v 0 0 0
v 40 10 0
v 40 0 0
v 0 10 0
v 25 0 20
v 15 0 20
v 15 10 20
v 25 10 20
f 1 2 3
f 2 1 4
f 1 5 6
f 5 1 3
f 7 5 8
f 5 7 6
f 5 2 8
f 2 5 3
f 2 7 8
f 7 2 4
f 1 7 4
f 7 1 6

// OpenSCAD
// file: GeometricConstants.scad
// ========================================
// Geometrics
// Version 2 constant definitions
// (c) Ralf Lange, longsoft.de
// ========================================

// include <../raspberry/PiPcbConstants.scad>
// include <../raspberry/PiPartConstants.scad>

// Dimensions

bbHeight = 4;
bbOuterD = 10;
bbInnerD = 6;     // 2*bucketPivotR
// main file
// ========================================
// Geometrics
// Version 1
// (c) Ralf Lange, longsoft.de
// ========================================

// Include the constants with the dimensions
// and the special variables
include <GeometricConstants.scad>;

// Which one would you like to see?
displayBallBearing = false;
displayPrism = true;
displayRamp = false;
displayAll = false;           // All parts together
displayImage = false;         // All parts together in one image

displayDevices = true;
withThread = false;

// Details of the drawing (larger is better)
$fn = 100;
transparency = 0.5;  // 1.0 is opace

module ballBearing(height, outerD, innerD)
{
  padding = (outerD-innerD)/3;
  difference() {
    cylinder(h=height, d=outerD, center = true);
    cylinder(h=height+0.1, d=outerD-padding, center = true);
  }
  color("blue") {
  difference() {
    cylinder(h=height, d=outerD-padding, center = true);
    cylinder(h=height+0.1, d=innerD+padding, center = true);
  }
  }
  difference() {
    cylinder(h=height, d=innerD+padding, center = true);
    cylinder(h=height+0.1, d=innerD, center = true);
  }
}

module prism(widthBottom, depth, height, widthTop = 0.1, center = false)
{
  assert(widthTop > 0, "");
  
  CubePoints = [
    [ 0, 0, 0 ],                                  // 0
    [ widthBottom, 0, 0 ],                        // 1
    [ widthBottom, depth, 0 ],                    // 2
    [ 0, depth, 0 ],                              // 3
    [ (widthBottom-widthTop)/2, 0, height ],      // 4
    [ (widthBottom+widthTop)/2, 0, height ],      // 5
    [ (widthBottom+widthTop)/2, depth, height ],  // 6
    [ (widthBottom-widthTop)/2, depth, height ]   // 7
  ];
  
  CubeFaces = [
    [0,1,2,3],  // bottom
    [4,5,1,0],  // front
    [7,6,5,4],  // top
    [5,6,2,1],  // right
    [6,7,3,2],  // back
    [7,4,0,3]   // left
  ];
  
  if (center == true) {
    translate([ -widthBottom/2, -depth/2, -height/2])
      polyhedron( CubePoints, CubeFaces );
  }
  else {
    polyhedron( CubePoints, CubeFaces );
  }
}

module ramp(widthBottom, depth, height, widthTop = 0.1, center = false)
{
  assert(widthTop > 0, "");
    
  CubePoints = [
    [ 0, 0, 0 ],                  // 0
    [ widthBottom, 0, 0 ],        // 1
    [ widthBottom, depth, 0 ],    // 2
    [ 0, depth, 0 ],              // 3
    [ 0, 0, height ],             // 4
    [ widthTop, 0, height ],      // 5
    [ widthTop, depth, height ],  // 6
    [ 0, depth, height ]          // 7
  ];
  
  CubeFaces = [
    [0,1,2,3],  // bottom
    [4,5,1,0],  // front
    [7,6,5,4],  // top
    [5,6,2,1],  // right
    [6,7,3,2],  // back
    [7,4,0,3]   // left
  ];
  
  if (center == true) {
    translate([ -widthBottom/2, -depth/2, -height/2])
      polyhedron( CubePoints, CubeFaces );
  }
  else {
    polyhedron( CubePoints, CubeFaces );
  }
}

// ==============================================================================================

if (displayBallBearing) {
  ballBearing( bbHeight, bbOuterD, bbInnerD);
}
if (displayPrism) {
  prism(40, 10, 20, 10, false);
}
if (displayRamp) {
  ramp(40, 10, 20, 10, false);
}
if (displayAll) {
  hopperOffsetZ = 160;
  
  if (!displayDevices) {
    translate([ 0, 0, bucketOffsetZ])
      rotate([ 0, bucketRotate, 90])
        tippingBucket();
  }
}
if (displayImage) {
  translate([ (caseD+10), 0, 0])
    rotate([ 0, 0, 90])
      case7back(false);

  translate([ 0, 0, 0])
    rotate([ 0, 0, 90])
      case7chassis(false);
}
